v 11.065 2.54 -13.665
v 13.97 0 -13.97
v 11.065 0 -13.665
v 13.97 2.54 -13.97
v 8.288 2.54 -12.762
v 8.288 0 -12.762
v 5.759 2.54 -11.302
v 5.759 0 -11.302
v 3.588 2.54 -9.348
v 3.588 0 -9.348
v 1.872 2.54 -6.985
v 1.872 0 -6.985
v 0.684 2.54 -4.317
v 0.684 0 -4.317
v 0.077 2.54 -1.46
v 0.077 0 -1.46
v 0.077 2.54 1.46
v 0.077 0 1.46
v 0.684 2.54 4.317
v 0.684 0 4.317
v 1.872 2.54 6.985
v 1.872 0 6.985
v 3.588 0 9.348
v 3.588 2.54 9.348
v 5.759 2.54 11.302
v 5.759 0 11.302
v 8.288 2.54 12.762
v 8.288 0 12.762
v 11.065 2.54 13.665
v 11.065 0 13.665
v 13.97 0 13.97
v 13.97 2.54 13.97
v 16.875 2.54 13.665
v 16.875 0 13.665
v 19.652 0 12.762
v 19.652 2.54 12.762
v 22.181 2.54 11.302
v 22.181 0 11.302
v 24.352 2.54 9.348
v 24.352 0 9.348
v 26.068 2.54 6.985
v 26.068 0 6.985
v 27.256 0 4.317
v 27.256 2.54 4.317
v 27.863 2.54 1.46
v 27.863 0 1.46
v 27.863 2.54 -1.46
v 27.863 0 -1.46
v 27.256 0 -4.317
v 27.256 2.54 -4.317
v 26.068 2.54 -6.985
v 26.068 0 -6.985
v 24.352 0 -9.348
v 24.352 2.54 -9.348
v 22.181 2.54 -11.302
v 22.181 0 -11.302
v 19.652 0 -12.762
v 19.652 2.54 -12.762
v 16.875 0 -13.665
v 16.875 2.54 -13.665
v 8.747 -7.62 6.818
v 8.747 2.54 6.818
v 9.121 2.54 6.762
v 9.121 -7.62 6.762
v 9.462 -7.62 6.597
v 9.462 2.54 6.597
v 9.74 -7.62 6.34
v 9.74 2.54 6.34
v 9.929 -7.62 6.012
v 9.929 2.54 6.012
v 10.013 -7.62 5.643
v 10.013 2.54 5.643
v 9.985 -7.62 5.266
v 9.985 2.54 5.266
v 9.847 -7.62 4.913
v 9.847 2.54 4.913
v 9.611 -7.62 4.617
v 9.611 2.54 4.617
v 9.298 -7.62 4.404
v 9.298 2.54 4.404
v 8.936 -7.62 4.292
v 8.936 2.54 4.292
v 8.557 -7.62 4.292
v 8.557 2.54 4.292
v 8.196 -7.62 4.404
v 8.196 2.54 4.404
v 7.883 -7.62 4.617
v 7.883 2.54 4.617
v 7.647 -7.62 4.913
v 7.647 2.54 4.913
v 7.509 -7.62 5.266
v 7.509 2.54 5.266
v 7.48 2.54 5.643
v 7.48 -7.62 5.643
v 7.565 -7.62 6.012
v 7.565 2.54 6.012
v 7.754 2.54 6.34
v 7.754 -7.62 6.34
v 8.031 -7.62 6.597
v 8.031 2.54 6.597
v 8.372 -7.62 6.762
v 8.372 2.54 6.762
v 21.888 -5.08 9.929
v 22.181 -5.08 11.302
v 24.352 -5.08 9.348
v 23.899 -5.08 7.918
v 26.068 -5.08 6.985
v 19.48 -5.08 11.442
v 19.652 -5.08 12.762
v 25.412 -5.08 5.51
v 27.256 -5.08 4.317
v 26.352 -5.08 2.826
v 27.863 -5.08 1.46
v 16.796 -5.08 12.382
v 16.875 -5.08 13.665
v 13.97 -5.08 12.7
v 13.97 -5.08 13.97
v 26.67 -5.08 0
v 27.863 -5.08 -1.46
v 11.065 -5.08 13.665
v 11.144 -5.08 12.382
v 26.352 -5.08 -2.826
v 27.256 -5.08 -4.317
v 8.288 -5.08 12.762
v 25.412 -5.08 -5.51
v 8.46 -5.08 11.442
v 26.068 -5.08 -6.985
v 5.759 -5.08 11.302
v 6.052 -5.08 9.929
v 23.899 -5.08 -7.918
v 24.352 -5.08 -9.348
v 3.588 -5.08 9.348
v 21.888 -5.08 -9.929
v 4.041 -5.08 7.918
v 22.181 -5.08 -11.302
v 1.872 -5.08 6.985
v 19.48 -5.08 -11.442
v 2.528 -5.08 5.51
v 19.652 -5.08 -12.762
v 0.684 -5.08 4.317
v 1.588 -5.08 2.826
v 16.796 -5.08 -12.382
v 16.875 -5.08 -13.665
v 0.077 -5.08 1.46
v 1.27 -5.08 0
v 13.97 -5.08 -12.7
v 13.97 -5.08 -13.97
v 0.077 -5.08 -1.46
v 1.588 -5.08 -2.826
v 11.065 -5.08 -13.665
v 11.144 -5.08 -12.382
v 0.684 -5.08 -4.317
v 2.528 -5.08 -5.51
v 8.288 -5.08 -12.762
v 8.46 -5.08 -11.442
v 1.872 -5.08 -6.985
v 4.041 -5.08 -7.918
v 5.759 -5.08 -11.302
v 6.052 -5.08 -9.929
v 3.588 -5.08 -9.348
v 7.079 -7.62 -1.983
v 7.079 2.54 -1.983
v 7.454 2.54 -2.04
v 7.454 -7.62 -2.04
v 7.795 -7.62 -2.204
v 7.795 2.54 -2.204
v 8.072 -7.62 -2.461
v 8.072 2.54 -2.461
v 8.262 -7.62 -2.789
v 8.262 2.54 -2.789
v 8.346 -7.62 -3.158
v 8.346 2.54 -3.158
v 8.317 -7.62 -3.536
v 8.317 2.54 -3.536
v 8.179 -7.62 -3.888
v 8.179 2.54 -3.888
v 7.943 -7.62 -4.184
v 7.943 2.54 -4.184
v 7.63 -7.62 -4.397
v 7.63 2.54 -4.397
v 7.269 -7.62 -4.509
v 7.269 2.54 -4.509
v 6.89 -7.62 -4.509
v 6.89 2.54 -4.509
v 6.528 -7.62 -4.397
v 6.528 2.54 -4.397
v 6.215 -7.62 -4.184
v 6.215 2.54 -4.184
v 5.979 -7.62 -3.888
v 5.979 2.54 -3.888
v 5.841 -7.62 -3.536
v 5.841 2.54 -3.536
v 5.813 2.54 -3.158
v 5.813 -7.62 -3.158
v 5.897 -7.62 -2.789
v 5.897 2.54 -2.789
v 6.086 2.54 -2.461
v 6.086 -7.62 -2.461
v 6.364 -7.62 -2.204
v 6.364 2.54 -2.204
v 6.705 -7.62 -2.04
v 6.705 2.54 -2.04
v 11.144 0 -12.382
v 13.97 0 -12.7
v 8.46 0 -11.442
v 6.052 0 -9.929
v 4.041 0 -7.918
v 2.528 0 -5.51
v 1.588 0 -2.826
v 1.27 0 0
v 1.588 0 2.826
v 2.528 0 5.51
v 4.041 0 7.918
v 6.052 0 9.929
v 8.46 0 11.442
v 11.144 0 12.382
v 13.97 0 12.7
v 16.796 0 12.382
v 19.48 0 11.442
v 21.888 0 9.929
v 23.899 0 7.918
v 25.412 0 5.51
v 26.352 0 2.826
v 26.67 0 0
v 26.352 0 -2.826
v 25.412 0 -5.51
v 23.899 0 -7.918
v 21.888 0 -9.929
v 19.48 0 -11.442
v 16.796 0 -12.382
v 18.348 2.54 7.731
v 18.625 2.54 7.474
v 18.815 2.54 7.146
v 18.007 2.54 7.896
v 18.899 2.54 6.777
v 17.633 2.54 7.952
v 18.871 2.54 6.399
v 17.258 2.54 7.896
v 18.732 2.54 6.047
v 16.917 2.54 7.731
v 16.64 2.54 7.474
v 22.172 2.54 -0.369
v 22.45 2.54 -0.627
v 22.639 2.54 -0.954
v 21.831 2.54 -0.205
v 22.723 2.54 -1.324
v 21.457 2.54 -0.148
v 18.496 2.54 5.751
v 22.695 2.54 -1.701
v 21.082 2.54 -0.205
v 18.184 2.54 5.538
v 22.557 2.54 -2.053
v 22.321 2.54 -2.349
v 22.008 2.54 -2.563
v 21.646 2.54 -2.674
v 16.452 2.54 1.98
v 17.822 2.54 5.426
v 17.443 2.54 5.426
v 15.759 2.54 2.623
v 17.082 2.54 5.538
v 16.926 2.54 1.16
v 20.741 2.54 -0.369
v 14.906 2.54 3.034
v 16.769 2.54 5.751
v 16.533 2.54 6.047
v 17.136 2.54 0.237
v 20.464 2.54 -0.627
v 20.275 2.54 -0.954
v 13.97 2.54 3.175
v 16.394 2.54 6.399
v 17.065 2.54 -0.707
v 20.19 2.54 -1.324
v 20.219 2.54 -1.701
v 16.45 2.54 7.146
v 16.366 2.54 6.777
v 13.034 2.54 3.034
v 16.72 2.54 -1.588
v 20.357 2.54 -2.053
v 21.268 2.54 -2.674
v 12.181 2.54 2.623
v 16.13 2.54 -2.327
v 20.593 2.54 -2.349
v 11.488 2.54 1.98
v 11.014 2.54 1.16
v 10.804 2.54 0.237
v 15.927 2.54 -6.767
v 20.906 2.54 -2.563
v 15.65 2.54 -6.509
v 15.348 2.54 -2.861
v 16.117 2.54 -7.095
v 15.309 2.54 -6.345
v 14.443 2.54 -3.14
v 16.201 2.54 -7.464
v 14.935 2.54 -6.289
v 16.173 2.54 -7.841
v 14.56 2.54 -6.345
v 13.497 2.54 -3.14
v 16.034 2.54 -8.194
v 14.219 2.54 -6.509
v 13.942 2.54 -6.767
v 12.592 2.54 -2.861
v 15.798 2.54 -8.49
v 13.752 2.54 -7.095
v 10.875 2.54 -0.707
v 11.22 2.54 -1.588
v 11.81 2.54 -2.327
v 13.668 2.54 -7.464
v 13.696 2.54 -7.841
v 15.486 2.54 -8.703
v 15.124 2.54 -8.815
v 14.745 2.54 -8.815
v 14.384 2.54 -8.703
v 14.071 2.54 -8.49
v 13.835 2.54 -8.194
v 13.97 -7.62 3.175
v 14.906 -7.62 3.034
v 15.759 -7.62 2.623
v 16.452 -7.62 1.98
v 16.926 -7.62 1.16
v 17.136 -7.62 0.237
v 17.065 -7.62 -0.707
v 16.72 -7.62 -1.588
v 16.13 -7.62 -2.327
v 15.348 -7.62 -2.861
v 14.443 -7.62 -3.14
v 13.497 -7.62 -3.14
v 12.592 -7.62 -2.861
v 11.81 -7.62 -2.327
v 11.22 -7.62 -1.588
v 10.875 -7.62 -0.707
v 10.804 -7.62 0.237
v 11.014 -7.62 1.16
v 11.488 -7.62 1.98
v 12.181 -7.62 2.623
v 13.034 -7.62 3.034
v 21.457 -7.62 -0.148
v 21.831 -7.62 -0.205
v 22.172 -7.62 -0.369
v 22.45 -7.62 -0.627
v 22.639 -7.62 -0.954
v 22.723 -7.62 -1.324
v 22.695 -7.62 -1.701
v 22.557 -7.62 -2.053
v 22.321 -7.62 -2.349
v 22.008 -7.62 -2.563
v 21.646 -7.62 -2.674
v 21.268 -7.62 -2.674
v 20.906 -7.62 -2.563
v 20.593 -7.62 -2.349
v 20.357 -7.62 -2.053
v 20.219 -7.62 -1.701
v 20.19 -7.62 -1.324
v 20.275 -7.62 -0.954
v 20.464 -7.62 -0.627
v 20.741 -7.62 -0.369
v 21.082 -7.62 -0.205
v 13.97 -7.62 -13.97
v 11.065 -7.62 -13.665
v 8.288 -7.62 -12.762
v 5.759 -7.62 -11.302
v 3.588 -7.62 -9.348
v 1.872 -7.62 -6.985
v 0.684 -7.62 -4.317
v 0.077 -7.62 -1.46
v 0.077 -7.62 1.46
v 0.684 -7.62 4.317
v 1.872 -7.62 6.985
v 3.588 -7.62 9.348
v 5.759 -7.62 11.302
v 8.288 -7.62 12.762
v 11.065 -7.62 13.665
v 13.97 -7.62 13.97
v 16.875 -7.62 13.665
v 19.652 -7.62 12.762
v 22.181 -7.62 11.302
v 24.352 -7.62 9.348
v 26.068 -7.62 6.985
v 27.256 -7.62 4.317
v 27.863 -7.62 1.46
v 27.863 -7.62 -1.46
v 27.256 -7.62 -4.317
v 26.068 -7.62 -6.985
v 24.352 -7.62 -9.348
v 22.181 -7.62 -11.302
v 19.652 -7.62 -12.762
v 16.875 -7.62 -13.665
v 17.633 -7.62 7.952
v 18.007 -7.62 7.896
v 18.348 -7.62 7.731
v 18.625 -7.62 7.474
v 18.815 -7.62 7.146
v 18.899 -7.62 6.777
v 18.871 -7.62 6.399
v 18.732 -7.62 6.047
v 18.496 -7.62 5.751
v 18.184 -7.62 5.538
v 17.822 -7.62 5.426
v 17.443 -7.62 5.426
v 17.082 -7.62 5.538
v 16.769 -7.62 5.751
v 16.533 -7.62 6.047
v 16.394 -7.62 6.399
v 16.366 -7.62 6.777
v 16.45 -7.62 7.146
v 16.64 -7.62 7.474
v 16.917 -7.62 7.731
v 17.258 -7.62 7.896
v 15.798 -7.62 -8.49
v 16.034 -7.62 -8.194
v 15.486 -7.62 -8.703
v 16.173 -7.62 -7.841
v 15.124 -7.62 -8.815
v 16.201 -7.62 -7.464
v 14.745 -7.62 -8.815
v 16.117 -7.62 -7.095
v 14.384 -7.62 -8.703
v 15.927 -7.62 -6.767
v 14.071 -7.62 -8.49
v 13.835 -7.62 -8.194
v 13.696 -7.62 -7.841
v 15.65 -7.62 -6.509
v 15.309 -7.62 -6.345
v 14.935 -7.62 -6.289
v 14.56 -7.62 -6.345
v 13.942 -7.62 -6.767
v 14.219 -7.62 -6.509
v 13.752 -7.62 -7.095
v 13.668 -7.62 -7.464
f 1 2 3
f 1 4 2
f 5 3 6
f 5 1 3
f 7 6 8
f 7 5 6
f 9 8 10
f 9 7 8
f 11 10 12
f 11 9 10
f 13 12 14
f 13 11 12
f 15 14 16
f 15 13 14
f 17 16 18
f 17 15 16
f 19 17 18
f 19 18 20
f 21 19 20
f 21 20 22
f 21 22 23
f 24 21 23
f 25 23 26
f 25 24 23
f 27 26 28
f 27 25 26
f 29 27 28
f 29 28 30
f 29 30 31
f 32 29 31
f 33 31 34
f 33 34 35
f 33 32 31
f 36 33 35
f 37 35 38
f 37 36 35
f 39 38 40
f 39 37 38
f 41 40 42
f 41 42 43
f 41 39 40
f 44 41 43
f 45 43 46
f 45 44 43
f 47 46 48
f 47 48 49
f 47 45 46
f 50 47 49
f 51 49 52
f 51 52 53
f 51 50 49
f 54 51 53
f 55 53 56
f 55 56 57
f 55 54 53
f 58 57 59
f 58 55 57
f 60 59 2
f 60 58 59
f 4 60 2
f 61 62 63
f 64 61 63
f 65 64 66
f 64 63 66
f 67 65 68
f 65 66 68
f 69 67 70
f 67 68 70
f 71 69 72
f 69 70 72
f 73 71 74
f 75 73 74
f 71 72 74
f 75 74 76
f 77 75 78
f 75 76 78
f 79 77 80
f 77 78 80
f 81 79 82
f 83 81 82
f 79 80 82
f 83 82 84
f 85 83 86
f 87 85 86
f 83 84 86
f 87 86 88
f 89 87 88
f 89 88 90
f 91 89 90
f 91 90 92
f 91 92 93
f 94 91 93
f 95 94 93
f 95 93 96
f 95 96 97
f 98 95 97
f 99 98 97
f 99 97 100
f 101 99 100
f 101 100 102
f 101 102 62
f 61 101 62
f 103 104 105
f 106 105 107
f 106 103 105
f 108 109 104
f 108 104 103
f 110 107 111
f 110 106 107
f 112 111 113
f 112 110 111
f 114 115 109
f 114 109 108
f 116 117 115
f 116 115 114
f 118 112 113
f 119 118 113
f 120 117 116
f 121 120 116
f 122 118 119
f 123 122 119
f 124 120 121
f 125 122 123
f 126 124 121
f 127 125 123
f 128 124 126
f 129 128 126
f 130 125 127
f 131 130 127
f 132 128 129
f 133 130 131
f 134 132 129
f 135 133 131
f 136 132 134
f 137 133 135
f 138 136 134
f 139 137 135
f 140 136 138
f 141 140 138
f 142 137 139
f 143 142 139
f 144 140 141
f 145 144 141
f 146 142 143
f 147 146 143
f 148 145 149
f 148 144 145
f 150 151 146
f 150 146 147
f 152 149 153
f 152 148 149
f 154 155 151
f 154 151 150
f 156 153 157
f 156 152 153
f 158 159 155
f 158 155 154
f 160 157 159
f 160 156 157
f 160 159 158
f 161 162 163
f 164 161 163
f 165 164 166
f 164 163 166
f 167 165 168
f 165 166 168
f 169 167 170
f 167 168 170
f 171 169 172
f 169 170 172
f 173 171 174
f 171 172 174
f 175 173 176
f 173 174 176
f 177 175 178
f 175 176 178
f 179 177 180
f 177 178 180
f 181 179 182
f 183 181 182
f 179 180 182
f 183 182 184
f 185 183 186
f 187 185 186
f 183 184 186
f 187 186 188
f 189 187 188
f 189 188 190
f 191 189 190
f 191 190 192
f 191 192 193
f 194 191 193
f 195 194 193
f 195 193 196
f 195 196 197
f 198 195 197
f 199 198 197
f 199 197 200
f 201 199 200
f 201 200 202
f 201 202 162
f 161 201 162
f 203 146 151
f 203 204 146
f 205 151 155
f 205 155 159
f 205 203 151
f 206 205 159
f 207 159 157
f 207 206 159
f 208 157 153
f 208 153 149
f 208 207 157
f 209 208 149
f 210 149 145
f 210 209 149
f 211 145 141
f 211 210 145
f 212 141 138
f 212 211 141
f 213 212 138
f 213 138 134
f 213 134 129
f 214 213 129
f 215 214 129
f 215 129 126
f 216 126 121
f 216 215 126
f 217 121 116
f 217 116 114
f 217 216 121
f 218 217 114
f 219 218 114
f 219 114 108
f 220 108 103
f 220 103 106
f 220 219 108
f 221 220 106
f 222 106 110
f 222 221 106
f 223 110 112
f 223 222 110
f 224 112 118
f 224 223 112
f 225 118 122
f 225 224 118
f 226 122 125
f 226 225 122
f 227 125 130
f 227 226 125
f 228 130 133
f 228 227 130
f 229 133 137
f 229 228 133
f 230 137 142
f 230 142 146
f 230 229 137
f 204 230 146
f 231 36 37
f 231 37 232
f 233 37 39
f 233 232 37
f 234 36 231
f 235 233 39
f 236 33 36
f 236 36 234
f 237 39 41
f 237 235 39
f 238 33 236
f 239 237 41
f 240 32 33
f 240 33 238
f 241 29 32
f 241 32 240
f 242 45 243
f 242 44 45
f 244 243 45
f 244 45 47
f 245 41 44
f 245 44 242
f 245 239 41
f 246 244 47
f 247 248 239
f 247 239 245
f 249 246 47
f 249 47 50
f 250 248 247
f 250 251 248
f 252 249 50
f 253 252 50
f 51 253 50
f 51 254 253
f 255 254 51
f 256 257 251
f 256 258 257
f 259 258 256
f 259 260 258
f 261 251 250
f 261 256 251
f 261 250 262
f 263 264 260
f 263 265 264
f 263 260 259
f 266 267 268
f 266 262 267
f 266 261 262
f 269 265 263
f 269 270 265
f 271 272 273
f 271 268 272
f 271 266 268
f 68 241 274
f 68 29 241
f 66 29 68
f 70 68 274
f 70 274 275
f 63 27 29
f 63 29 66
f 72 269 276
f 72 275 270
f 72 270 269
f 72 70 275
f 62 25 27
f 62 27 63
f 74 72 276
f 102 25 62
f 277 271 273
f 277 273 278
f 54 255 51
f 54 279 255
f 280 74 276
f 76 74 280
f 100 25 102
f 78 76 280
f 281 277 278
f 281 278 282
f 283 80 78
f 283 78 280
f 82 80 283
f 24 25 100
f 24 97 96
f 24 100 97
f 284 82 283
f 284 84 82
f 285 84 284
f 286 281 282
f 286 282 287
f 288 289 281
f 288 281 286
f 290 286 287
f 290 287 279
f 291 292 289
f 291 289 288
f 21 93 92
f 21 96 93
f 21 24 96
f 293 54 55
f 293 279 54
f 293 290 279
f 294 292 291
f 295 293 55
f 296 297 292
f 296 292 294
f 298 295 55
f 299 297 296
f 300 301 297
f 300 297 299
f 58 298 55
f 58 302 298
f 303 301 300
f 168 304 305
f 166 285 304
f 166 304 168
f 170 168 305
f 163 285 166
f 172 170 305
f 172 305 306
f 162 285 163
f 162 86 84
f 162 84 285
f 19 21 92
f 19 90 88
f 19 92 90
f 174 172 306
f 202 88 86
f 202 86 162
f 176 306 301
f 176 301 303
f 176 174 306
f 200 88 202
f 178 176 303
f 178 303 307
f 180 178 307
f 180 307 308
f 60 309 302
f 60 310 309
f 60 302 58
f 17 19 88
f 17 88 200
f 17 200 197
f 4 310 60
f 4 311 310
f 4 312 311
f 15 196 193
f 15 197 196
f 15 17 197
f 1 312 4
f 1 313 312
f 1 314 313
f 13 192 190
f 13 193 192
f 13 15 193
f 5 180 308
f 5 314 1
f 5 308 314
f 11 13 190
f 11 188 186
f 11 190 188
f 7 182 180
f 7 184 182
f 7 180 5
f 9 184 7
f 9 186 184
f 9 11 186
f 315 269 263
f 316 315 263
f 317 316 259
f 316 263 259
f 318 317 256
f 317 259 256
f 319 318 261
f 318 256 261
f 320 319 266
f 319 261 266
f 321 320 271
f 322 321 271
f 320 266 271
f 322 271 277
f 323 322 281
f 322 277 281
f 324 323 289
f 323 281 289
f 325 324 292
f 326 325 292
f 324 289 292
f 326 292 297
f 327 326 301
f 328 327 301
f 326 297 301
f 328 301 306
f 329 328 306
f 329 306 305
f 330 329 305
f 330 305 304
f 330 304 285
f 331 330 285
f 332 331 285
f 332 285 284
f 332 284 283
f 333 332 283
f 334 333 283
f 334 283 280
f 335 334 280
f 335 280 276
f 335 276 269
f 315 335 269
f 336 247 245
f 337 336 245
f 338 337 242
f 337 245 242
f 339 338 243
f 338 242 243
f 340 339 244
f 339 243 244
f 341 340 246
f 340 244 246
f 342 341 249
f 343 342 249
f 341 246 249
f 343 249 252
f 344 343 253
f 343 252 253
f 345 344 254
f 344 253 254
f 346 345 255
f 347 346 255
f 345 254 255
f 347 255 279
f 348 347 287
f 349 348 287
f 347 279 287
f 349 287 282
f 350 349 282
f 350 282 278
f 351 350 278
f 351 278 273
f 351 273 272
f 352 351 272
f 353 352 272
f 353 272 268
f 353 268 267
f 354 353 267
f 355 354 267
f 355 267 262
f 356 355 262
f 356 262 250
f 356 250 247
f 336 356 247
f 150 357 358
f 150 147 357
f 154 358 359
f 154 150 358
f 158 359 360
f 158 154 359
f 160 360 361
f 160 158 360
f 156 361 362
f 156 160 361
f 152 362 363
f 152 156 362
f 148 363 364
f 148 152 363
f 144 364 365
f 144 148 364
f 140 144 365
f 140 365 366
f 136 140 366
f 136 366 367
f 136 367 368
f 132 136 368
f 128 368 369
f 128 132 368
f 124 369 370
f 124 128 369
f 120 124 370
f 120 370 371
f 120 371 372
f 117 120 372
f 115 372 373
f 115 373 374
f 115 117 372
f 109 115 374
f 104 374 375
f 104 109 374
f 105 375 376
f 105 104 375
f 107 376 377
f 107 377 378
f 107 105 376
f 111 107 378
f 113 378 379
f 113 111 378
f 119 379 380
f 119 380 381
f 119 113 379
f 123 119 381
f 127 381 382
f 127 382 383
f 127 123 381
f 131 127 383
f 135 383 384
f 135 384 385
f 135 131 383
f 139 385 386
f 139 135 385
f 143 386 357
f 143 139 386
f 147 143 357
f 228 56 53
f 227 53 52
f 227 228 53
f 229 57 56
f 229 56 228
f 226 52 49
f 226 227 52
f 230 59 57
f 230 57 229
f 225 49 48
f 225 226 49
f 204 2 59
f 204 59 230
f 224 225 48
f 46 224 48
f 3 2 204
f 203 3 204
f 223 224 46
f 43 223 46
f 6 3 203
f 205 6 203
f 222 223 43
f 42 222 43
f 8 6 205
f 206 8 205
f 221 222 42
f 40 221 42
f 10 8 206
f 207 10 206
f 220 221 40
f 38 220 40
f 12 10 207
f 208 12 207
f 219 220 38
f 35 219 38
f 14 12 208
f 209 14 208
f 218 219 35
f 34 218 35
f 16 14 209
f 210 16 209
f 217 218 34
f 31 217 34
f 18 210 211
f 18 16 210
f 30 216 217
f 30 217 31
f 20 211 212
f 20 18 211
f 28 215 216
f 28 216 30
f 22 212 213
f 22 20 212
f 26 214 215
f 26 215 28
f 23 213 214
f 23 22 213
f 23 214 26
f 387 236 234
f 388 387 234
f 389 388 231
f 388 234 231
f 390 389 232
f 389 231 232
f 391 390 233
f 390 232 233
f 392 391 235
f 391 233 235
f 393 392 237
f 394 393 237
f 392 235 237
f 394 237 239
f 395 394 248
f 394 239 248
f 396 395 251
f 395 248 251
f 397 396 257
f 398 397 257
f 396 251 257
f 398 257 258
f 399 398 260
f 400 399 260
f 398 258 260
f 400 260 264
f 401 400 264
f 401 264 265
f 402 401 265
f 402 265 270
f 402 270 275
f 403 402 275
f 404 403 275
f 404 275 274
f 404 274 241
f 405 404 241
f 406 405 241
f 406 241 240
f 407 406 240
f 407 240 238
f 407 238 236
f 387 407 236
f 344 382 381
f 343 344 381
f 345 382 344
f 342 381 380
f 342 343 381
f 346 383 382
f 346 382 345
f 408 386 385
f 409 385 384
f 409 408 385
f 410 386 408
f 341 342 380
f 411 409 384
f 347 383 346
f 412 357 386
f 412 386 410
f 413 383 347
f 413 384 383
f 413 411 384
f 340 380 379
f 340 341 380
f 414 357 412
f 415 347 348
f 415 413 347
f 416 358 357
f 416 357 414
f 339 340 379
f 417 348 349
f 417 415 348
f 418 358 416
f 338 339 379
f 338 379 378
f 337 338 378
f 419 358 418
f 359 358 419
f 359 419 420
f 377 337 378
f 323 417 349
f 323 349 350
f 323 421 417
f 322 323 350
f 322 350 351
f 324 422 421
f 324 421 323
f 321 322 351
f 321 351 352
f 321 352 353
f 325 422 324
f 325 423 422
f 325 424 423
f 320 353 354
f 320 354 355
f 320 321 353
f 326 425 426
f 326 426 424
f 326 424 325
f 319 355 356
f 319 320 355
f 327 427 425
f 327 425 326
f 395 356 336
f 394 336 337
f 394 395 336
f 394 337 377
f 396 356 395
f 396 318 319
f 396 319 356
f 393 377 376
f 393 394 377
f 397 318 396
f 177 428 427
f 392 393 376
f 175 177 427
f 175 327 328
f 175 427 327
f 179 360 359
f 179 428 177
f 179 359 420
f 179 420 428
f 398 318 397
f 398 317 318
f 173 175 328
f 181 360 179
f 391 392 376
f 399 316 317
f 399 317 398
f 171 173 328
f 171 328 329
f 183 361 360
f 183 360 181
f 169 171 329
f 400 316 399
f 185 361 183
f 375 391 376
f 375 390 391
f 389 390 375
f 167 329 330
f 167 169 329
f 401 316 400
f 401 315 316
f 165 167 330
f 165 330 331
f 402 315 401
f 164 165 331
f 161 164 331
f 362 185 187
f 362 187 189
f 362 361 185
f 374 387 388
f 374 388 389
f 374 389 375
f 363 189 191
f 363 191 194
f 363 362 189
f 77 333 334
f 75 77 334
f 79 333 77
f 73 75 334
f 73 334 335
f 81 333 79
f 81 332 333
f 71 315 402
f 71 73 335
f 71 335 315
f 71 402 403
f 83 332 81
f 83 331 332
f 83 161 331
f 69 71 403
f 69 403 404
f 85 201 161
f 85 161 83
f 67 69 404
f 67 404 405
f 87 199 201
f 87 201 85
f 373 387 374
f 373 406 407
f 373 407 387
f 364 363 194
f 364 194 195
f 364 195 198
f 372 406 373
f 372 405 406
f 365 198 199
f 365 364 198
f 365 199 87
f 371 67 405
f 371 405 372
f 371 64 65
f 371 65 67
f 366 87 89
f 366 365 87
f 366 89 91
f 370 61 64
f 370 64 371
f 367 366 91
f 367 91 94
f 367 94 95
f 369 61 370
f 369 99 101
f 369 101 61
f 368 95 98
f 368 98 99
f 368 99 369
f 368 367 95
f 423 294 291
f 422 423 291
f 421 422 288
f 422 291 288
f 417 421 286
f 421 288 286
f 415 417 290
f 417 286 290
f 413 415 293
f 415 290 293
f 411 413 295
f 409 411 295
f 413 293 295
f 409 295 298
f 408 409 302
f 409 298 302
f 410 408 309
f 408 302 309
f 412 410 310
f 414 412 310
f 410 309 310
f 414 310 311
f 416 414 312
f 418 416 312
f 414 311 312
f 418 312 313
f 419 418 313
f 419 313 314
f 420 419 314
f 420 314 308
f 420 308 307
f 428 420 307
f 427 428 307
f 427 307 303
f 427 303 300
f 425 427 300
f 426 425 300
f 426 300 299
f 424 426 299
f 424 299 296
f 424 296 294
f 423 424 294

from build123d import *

# Parameters (mm, degrees)
SKETCH4_R          = 3.175
CUT_EXTRUDE3_DEPTH = 33.848593577
SKETCH6_R          = 1.27
CUT_EXTRUDE5_DEPTH = 33.848593577


with BuildPart() as part:
    # Sketch1 → Revolve1 (revolve)
    with BuildSketch(Plane.XY, mode=Mode.PRIVATE) as revolve1_sk:
        Polygon((0, 0), (0, 2.54), (13.97, 2.54), (13.97, -7.62), (0, -7.62), (0, -5.08), (1.27, -5.08), (1.27, 0), align=None)
    revolve(revolve1_sk.sketch.rotate(Axis((13.97, -7.62, 0), (0, 1, 0)), 270), axis=Axis((13.97, -7.62, 0), (0, 1, 0)))

    # Sketch4 → Cut-Extrude3 (cut, through all)
    with BuildSketch(Plane(origin=(0, 2.54, 0), x_dir=(1, 0, 0), z_dir=(0, 1, 0))):
        with Locations(Location((13.97, 0, 0), (0, 0, 270))):
            Circle(SKETCH4_R)
    extrude(amount=-CUT_EXTRUDE3_DEPTH, mode=Mode.SUBTRACT)

    # Sketch6 → Cut-Extrude5 (cut, through all)
    with BuildSketch(Plane(origin=(0, 2.54, 0), x_dir=(1, 0, 0), z_dir=(0, 1, 0))):
        with Locations(Location((7.079305779, 3.253111304, 0), (0, 0, 270))):
            Circle(SKETCH6_R)
        with Locations(Location((14.934551087, 7.558706318, 0), (0, 0, 270))):
            Circle(SKETCH6_R)
        with Locations(Location((21.456819576, 1.418426111, 0), (0, 0, 270))):
            Circle(SKETCH6_R)
        with Locations(Location((17.632557879, -6.682070771, 0), (0, 0, 270))):
            Circle(SKETCH6_R)
        with Locations(Location((8.746765678, -5.548172963, 0), (0, 0, 270))):
            Circle(SKETCH6_R)
    extrude(amount=-CUT_EXTRUDE5_DEPTH, mode=Mode.SUBTRACT)


solid = part.part
